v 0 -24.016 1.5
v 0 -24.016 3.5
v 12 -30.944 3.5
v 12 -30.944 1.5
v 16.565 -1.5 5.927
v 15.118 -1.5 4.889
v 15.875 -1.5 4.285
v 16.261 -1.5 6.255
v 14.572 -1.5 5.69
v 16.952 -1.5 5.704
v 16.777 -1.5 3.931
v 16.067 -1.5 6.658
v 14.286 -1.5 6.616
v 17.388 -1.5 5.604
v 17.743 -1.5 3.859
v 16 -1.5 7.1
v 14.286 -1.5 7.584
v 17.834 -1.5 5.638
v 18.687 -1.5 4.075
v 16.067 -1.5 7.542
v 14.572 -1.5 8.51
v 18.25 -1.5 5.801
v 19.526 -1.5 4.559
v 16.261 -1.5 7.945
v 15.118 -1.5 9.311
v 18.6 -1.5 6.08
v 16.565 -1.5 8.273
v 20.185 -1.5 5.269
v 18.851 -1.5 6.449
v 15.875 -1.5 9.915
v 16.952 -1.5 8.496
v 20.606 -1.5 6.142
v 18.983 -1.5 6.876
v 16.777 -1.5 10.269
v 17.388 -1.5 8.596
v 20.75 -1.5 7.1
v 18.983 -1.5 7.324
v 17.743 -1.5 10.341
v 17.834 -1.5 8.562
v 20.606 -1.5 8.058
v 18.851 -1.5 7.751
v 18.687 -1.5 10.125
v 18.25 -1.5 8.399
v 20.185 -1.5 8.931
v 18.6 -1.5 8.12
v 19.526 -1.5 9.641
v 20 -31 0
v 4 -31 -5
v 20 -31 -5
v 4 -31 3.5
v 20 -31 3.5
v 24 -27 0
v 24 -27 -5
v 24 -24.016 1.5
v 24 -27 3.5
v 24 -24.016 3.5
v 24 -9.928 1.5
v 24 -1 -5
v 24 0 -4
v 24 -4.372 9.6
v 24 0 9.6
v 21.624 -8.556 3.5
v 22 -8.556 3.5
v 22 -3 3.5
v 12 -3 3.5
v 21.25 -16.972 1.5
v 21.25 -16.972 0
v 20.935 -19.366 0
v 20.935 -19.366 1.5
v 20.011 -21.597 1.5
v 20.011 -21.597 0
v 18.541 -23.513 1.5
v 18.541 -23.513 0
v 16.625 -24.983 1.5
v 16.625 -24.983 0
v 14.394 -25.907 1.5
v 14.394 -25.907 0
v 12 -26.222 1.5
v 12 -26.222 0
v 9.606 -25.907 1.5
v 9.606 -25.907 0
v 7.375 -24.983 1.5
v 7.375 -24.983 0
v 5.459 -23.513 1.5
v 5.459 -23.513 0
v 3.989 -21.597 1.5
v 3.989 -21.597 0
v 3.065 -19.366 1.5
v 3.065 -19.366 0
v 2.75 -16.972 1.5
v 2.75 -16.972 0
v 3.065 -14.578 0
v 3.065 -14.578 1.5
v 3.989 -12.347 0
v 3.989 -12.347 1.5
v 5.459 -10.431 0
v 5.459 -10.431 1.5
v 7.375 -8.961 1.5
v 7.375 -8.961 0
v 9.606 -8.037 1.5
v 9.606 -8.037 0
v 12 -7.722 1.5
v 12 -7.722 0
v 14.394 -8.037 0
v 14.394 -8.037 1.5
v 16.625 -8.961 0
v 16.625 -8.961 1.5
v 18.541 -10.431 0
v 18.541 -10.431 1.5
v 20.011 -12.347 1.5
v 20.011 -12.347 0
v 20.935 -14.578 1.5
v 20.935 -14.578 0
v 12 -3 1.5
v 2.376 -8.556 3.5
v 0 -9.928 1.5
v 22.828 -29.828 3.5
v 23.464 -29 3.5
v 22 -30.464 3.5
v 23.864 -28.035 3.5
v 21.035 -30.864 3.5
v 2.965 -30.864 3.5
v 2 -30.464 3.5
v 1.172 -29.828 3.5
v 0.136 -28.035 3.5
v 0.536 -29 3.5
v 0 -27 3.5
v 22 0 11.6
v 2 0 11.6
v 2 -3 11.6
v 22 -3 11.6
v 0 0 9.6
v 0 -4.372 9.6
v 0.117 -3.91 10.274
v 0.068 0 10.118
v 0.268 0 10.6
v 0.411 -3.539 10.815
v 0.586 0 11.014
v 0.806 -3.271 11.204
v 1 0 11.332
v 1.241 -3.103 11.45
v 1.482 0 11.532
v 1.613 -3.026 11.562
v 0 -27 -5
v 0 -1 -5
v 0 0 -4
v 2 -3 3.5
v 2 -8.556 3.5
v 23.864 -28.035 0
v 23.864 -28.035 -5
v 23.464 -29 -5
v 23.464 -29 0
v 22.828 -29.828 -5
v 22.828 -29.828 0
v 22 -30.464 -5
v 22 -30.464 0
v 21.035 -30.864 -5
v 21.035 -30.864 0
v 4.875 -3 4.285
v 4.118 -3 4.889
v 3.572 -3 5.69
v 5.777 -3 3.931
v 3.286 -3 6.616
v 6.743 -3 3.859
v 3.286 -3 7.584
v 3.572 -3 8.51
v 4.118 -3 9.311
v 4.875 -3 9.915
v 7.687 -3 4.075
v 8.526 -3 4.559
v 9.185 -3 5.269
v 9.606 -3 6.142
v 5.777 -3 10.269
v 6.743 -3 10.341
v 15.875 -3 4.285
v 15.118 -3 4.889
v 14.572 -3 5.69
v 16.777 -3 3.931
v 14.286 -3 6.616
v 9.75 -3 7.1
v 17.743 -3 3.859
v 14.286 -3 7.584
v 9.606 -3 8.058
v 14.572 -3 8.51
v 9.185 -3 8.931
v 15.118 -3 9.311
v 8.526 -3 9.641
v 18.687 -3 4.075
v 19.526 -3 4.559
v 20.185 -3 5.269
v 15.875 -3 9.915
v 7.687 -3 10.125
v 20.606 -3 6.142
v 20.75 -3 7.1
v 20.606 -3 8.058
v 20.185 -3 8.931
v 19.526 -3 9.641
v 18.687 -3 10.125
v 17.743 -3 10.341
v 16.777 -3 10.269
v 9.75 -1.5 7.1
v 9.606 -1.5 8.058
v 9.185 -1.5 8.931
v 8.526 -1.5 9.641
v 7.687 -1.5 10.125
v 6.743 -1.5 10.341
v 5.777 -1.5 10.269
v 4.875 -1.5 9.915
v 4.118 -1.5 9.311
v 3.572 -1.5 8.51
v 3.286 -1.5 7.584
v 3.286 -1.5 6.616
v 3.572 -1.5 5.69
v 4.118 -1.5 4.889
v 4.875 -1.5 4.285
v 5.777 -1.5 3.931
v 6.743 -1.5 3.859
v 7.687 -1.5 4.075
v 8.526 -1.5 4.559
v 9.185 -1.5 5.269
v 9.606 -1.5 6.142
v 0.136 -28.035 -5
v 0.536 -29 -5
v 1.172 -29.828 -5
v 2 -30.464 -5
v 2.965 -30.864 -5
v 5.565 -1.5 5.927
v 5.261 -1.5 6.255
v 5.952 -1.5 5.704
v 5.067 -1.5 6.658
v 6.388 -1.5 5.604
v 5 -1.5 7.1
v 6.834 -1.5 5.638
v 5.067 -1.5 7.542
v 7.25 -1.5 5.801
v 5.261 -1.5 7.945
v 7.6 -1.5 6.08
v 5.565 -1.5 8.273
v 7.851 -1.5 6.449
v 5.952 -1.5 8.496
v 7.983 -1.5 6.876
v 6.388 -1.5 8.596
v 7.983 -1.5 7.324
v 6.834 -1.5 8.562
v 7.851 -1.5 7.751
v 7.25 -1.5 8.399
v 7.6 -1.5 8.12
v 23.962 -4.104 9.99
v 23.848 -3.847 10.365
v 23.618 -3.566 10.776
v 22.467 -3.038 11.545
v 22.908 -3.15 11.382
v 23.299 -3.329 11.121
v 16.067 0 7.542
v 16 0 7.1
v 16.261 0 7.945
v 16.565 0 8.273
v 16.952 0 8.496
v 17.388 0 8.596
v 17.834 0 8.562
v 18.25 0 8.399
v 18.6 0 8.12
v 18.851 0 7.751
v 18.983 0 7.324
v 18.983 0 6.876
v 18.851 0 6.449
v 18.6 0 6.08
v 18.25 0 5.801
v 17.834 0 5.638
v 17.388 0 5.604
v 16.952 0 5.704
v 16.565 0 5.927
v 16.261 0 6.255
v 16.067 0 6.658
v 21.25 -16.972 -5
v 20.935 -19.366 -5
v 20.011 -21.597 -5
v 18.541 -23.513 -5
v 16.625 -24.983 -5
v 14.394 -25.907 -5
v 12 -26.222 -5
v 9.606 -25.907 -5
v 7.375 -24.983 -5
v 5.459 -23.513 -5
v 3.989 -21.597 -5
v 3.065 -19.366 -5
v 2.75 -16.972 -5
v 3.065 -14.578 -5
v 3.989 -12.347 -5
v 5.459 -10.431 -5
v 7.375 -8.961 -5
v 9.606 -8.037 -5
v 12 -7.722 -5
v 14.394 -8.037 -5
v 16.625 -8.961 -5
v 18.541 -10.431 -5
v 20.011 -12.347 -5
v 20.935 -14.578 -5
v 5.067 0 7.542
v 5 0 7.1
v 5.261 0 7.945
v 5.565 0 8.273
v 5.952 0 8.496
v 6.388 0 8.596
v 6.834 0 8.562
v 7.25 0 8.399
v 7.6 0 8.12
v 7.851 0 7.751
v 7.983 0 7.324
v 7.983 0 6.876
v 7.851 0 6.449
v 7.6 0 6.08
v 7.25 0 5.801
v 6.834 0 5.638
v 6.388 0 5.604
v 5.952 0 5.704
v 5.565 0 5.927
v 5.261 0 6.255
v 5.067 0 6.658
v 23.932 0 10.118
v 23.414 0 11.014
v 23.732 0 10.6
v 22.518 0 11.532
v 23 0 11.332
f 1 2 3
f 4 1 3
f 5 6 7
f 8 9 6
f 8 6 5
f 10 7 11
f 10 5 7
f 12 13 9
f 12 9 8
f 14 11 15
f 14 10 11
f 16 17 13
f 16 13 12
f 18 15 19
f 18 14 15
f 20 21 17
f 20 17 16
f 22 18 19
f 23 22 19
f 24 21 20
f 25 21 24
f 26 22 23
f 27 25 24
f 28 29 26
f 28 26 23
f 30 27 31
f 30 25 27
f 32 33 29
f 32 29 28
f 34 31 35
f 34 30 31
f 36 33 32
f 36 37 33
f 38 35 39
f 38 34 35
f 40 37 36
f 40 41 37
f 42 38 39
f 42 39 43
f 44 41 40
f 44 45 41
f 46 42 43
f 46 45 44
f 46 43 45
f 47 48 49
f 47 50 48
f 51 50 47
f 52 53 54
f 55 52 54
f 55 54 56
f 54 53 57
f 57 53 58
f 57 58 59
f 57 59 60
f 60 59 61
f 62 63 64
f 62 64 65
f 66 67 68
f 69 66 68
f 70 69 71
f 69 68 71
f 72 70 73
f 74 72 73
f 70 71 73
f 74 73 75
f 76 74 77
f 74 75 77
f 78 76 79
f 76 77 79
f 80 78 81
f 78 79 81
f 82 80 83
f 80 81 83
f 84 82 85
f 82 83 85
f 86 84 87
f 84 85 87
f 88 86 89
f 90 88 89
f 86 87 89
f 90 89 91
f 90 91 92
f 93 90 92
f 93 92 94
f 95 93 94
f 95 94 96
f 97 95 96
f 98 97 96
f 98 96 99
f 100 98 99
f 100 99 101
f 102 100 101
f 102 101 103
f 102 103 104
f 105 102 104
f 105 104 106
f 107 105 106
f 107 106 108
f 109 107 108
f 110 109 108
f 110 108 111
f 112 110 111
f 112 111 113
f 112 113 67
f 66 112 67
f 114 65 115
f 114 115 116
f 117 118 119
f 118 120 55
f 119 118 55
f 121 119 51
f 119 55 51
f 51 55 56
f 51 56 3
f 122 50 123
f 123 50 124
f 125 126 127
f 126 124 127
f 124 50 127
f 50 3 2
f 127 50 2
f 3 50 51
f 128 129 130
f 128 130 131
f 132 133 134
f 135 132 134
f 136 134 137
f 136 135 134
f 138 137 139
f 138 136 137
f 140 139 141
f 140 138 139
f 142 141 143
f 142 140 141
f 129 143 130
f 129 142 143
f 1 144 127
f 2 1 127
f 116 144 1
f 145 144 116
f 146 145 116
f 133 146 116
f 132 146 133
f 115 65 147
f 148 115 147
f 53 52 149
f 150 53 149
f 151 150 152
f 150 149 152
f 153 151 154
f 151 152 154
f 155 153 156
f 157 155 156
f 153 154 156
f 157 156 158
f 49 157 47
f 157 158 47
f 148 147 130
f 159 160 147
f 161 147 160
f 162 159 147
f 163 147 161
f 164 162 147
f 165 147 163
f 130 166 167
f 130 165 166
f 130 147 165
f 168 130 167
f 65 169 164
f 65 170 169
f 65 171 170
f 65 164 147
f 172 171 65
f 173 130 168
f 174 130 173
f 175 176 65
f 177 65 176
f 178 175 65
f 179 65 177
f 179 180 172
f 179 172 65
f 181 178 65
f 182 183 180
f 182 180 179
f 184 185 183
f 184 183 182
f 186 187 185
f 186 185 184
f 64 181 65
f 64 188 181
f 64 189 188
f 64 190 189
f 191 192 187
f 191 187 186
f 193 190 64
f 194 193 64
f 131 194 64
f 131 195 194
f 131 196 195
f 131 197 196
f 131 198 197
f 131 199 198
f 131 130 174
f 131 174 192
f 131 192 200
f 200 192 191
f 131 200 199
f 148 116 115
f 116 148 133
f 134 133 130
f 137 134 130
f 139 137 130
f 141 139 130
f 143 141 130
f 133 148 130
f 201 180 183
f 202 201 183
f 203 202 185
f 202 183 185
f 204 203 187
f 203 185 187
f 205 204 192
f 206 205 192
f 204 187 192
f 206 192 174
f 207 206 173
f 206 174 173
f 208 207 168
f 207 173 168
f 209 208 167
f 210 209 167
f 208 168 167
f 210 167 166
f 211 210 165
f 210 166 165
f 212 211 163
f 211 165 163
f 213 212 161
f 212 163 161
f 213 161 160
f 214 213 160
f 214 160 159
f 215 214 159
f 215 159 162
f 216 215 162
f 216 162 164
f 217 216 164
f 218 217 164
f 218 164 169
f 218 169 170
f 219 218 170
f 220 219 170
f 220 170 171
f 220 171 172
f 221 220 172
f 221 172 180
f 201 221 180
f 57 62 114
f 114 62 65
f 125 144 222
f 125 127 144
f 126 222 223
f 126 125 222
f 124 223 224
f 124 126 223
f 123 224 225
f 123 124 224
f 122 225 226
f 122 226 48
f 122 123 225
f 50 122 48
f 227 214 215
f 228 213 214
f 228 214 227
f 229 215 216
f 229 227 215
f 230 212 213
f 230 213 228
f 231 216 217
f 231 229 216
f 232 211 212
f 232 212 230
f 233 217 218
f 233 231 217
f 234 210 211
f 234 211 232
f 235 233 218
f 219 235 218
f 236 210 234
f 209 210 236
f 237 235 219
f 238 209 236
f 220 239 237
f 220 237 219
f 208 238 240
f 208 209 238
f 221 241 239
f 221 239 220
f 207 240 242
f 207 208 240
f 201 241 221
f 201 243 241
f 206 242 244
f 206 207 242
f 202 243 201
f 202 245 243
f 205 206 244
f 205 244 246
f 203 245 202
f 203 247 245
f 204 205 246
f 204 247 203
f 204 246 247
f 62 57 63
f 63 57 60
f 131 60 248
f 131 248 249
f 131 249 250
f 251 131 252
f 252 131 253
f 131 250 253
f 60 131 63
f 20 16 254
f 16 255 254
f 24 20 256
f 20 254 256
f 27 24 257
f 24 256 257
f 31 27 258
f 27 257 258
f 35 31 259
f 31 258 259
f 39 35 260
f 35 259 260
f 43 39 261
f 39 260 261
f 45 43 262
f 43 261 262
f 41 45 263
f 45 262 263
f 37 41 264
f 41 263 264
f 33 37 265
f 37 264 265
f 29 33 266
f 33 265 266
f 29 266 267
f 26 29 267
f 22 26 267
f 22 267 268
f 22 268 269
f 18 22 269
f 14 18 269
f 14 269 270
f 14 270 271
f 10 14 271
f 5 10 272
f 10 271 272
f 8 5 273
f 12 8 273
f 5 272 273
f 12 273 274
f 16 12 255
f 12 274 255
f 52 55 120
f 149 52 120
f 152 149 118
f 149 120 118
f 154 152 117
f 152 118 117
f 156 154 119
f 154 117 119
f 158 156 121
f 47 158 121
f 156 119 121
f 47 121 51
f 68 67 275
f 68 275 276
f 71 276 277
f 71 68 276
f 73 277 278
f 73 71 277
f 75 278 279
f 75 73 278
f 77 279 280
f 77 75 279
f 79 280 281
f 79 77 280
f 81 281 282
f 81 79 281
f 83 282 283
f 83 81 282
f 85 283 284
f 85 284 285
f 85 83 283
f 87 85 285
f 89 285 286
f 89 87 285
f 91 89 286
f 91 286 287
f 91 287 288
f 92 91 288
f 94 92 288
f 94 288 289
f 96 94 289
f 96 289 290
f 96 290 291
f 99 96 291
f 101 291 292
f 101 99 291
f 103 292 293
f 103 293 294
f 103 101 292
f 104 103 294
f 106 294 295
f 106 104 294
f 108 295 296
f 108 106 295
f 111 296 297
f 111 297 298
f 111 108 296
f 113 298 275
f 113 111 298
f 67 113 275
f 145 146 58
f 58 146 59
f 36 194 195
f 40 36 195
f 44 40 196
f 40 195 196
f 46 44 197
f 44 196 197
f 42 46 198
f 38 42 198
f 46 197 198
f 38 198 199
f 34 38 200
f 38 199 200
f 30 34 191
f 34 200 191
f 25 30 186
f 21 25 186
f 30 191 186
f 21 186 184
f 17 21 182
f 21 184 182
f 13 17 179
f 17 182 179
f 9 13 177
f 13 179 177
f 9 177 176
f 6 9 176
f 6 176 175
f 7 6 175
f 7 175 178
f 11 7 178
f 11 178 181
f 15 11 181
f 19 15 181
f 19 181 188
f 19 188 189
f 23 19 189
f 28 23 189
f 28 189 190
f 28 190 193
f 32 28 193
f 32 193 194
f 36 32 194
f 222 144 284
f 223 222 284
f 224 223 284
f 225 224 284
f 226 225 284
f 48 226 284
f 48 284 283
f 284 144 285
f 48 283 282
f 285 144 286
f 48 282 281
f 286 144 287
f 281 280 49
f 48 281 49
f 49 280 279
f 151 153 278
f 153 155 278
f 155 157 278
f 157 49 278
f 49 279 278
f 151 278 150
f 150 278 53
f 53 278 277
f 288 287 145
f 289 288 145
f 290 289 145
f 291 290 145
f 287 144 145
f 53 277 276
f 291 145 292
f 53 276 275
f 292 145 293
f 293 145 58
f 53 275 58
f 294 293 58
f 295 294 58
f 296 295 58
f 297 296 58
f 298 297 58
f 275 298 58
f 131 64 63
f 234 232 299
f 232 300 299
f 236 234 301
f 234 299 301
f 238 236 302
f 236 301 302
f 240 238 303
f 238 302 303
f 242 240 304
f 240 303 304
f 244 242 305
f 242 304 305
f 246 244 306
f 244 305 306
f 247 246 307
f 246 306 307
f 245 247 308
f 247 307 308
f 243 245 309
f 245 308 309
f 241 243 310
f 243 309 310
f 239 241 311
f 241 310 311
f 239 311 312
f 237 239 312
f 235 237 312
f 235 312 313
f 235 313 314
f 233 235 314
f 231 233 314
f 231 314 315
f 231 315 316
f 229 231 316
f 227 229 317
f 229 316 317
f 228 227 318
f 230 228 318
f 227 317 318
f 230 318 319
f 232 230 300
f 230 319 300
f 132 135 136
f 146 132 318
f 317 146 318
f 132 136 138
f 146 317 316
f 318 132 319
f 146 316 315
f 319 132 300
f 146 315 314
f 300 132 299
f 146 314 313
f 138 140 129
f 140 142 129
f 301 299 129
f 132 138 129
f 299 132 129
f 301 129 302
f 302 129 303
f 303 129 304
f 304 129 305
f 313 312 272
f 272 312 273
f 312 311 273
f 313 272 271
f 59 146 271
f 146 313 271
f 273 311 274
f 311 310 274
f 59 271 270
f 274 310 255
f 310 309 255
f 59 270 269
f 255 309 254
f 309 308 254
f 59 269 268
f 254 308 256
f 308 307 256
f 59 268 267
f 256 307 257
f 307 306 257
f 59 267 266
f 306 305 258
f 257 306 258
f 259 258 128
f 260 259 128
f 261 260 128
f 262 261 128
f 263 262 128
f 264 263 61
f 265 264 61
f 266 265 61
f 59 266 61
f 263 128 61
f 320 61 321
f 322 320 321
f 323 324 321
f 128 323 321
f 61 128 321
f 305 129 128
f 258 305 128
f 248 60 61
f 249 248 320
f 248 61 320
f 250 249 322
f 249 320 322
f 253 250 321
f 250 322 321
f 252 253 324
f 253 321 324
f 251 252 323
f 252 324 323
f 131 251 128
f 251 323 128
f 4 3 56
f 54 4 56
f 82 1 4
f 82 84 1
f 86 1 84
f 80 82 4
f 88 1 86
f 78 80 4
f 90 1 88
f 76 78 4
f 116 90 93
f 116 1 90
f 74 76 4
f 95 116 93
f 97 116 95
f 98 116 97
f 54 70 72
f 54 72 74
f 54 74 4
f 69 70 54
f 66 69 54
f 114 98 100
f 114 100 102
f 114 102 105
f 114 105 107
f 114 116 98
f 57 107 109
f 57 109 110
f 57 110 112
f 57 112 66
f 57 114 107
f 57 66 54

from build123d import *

# Parameters (mm, degrees)
F0_W           = 24
F0_H           = 11.6
F1_DEPTH       = 3
F3_D           = 3
F3_CBORE_D     = 6.5
F3_CBORE_DEPTH = 1.5
F4_DEPTH       = 28
F7_R           = 4
F8_R           = 9.25
F9_DEPTH       = 25
F10_DEPTH      = 5
F11_DEPTH      = 2
F2_W           = 2
F2_H           = 8.1
F12_REACH      = 36.3442607534
F5_W           = 2
F5_H           = 8.1
F13_REACH      = 36.3442607534
F14_SIZE       = 1
F15_R          = 2
F17_DEPTH      = 25


# Not quite as in the source:
# - a feature names something its author has since deleted; it is built from what else it names


with BuildPart() as f1:
    # F0 (on Front) → F1 (new body)
    with BuildSketch(Plane.XZ):
        with Locations((12, 5.8)):
            Rectangle(F0_W, F0_H)
    extrude(amount=F1_DEPTH)

    # F3 (through all)
    with Locations(Plane.XZ.offset(3)):
        with Locations((6.5, 7.1), (17.5, 7.1)):
            CounterBoreHole(F3_D / 2, F3_CBORE_D / 2, F3_CBORE_DEPTH)

    # F2 (on face) → F4 (join)
    with BuildSketch(Plane.XZ.offset(3)):
        Polygon((0, 3.5), (0, 0), (24, 0), (24, 3.5), (22, 3.5), (2, 3.5), align=None)
    extrude(amount=F4_DEPTH)

    # F7
    f7_edges = [f1.edges().sort_by_distance(p)[0] for p in [
        (24, -31, 1.75),
        (0, -31, 1.75),
    ]]
    fillet(f7_edges, radius=F7_R)

    # F8 (on face) → F9 (cut)
    with BuildSketch(Plane(origin=(0, 0, 0), x_dir=(1, 0, 0), z_dir=(0, 0, -1))):
        with Locations((12, 16.9718765144)):
            Circle(F8_R)
    extrude(amount=-F9_DEPTH, mode=Mode.SUBTRACT)

    # F10 (add): a face of the model
    f10_faces = [f1.faces().sort_by_distance(p)[0] for p in [
        (0.3920459157, -13.5, 0),
    ]]
    extrude(f10_faces, amount=F10_DEPTH)

    # F6 (on face) → F11 (cut)
    with BuildSketch(Plane.XY.offset(3.5)):
        Polygon((24, -24.0155497985), (24, -9.9282032303), (12, -3), (0, -9.9282032303), (0, -24.0155497985), (12, -30.9437530288), align=None)
    extrude(amount=-F11_DEPTH, mode=Mode.SUBTRACT)

    f12_end = Plane(origin=(6, -6.4641016151, 2.5), x_dir=(-0.8660254038, -0.5, 0), z_dir=(0.5, -0.8660254038, 0))
    # F2 (on face) → F12 (join, up to a plane its end follows)
    with BuildSketch(Plane.XZ.offset(3)):
        with Locations((1, 7.55)):
            Rectangle(F2_W, F2_H)
    f12_long = extrude(amount=F12_REACH, mode=Mode.PRIVATE)
    add(split(f12_long, bisect_by=f12_end, keep=Keep.BOTTOM, mode=Mode.PRIVATE))

    f13_end = Plane(origin=(18, -6.4641016151, 2.5), x_dir=(-0.8660254038, 0.5, 0), z_dir=(-0.5, -0.8660254038, 0))
    # F5 (on face) → F13 (join, up to a plane its end follows)
    with BuildSketch(Plane.XZ.offset(3)):
        with Locations((23, 7.55)):
            Rectangle(F5_W, F5_H)
    f13_long = extrude(amount=F13_REACH, mode=Mode.PRIVATE)
    add(split(f13_long, bisect_by=f13_end, keep=Keep.BOTTOM, mode=Mode.PRIVATE))

    # F14
    f14_edges = [f1.edges().sort_by_distance(p)[0] for p in [
        (12, 0, -5),
    ]]
    chamfer(f14_edges, length=F14_SIZE)

    # F15
    f15_edges = [f1.edges().sort_by_distance(p)[0] for p in [
        (24, -4.964102, 11.6),
        (0, -4.964102, 11.6),
    ]]
    fillet(f15_edges, radius=F15_R)

    # F16 (on face) → F17 (cut)
    with BuildSketch(Plane.YZ.offset(24)):
        Polygon((-9.9282032303, 11.6), (-9.9282032303, 1.5), (-3, 11.6), align=None)
    extrude(amount=-F17_DEPTH, mode=Mode.SUBTRACT)


solid = f1.part
